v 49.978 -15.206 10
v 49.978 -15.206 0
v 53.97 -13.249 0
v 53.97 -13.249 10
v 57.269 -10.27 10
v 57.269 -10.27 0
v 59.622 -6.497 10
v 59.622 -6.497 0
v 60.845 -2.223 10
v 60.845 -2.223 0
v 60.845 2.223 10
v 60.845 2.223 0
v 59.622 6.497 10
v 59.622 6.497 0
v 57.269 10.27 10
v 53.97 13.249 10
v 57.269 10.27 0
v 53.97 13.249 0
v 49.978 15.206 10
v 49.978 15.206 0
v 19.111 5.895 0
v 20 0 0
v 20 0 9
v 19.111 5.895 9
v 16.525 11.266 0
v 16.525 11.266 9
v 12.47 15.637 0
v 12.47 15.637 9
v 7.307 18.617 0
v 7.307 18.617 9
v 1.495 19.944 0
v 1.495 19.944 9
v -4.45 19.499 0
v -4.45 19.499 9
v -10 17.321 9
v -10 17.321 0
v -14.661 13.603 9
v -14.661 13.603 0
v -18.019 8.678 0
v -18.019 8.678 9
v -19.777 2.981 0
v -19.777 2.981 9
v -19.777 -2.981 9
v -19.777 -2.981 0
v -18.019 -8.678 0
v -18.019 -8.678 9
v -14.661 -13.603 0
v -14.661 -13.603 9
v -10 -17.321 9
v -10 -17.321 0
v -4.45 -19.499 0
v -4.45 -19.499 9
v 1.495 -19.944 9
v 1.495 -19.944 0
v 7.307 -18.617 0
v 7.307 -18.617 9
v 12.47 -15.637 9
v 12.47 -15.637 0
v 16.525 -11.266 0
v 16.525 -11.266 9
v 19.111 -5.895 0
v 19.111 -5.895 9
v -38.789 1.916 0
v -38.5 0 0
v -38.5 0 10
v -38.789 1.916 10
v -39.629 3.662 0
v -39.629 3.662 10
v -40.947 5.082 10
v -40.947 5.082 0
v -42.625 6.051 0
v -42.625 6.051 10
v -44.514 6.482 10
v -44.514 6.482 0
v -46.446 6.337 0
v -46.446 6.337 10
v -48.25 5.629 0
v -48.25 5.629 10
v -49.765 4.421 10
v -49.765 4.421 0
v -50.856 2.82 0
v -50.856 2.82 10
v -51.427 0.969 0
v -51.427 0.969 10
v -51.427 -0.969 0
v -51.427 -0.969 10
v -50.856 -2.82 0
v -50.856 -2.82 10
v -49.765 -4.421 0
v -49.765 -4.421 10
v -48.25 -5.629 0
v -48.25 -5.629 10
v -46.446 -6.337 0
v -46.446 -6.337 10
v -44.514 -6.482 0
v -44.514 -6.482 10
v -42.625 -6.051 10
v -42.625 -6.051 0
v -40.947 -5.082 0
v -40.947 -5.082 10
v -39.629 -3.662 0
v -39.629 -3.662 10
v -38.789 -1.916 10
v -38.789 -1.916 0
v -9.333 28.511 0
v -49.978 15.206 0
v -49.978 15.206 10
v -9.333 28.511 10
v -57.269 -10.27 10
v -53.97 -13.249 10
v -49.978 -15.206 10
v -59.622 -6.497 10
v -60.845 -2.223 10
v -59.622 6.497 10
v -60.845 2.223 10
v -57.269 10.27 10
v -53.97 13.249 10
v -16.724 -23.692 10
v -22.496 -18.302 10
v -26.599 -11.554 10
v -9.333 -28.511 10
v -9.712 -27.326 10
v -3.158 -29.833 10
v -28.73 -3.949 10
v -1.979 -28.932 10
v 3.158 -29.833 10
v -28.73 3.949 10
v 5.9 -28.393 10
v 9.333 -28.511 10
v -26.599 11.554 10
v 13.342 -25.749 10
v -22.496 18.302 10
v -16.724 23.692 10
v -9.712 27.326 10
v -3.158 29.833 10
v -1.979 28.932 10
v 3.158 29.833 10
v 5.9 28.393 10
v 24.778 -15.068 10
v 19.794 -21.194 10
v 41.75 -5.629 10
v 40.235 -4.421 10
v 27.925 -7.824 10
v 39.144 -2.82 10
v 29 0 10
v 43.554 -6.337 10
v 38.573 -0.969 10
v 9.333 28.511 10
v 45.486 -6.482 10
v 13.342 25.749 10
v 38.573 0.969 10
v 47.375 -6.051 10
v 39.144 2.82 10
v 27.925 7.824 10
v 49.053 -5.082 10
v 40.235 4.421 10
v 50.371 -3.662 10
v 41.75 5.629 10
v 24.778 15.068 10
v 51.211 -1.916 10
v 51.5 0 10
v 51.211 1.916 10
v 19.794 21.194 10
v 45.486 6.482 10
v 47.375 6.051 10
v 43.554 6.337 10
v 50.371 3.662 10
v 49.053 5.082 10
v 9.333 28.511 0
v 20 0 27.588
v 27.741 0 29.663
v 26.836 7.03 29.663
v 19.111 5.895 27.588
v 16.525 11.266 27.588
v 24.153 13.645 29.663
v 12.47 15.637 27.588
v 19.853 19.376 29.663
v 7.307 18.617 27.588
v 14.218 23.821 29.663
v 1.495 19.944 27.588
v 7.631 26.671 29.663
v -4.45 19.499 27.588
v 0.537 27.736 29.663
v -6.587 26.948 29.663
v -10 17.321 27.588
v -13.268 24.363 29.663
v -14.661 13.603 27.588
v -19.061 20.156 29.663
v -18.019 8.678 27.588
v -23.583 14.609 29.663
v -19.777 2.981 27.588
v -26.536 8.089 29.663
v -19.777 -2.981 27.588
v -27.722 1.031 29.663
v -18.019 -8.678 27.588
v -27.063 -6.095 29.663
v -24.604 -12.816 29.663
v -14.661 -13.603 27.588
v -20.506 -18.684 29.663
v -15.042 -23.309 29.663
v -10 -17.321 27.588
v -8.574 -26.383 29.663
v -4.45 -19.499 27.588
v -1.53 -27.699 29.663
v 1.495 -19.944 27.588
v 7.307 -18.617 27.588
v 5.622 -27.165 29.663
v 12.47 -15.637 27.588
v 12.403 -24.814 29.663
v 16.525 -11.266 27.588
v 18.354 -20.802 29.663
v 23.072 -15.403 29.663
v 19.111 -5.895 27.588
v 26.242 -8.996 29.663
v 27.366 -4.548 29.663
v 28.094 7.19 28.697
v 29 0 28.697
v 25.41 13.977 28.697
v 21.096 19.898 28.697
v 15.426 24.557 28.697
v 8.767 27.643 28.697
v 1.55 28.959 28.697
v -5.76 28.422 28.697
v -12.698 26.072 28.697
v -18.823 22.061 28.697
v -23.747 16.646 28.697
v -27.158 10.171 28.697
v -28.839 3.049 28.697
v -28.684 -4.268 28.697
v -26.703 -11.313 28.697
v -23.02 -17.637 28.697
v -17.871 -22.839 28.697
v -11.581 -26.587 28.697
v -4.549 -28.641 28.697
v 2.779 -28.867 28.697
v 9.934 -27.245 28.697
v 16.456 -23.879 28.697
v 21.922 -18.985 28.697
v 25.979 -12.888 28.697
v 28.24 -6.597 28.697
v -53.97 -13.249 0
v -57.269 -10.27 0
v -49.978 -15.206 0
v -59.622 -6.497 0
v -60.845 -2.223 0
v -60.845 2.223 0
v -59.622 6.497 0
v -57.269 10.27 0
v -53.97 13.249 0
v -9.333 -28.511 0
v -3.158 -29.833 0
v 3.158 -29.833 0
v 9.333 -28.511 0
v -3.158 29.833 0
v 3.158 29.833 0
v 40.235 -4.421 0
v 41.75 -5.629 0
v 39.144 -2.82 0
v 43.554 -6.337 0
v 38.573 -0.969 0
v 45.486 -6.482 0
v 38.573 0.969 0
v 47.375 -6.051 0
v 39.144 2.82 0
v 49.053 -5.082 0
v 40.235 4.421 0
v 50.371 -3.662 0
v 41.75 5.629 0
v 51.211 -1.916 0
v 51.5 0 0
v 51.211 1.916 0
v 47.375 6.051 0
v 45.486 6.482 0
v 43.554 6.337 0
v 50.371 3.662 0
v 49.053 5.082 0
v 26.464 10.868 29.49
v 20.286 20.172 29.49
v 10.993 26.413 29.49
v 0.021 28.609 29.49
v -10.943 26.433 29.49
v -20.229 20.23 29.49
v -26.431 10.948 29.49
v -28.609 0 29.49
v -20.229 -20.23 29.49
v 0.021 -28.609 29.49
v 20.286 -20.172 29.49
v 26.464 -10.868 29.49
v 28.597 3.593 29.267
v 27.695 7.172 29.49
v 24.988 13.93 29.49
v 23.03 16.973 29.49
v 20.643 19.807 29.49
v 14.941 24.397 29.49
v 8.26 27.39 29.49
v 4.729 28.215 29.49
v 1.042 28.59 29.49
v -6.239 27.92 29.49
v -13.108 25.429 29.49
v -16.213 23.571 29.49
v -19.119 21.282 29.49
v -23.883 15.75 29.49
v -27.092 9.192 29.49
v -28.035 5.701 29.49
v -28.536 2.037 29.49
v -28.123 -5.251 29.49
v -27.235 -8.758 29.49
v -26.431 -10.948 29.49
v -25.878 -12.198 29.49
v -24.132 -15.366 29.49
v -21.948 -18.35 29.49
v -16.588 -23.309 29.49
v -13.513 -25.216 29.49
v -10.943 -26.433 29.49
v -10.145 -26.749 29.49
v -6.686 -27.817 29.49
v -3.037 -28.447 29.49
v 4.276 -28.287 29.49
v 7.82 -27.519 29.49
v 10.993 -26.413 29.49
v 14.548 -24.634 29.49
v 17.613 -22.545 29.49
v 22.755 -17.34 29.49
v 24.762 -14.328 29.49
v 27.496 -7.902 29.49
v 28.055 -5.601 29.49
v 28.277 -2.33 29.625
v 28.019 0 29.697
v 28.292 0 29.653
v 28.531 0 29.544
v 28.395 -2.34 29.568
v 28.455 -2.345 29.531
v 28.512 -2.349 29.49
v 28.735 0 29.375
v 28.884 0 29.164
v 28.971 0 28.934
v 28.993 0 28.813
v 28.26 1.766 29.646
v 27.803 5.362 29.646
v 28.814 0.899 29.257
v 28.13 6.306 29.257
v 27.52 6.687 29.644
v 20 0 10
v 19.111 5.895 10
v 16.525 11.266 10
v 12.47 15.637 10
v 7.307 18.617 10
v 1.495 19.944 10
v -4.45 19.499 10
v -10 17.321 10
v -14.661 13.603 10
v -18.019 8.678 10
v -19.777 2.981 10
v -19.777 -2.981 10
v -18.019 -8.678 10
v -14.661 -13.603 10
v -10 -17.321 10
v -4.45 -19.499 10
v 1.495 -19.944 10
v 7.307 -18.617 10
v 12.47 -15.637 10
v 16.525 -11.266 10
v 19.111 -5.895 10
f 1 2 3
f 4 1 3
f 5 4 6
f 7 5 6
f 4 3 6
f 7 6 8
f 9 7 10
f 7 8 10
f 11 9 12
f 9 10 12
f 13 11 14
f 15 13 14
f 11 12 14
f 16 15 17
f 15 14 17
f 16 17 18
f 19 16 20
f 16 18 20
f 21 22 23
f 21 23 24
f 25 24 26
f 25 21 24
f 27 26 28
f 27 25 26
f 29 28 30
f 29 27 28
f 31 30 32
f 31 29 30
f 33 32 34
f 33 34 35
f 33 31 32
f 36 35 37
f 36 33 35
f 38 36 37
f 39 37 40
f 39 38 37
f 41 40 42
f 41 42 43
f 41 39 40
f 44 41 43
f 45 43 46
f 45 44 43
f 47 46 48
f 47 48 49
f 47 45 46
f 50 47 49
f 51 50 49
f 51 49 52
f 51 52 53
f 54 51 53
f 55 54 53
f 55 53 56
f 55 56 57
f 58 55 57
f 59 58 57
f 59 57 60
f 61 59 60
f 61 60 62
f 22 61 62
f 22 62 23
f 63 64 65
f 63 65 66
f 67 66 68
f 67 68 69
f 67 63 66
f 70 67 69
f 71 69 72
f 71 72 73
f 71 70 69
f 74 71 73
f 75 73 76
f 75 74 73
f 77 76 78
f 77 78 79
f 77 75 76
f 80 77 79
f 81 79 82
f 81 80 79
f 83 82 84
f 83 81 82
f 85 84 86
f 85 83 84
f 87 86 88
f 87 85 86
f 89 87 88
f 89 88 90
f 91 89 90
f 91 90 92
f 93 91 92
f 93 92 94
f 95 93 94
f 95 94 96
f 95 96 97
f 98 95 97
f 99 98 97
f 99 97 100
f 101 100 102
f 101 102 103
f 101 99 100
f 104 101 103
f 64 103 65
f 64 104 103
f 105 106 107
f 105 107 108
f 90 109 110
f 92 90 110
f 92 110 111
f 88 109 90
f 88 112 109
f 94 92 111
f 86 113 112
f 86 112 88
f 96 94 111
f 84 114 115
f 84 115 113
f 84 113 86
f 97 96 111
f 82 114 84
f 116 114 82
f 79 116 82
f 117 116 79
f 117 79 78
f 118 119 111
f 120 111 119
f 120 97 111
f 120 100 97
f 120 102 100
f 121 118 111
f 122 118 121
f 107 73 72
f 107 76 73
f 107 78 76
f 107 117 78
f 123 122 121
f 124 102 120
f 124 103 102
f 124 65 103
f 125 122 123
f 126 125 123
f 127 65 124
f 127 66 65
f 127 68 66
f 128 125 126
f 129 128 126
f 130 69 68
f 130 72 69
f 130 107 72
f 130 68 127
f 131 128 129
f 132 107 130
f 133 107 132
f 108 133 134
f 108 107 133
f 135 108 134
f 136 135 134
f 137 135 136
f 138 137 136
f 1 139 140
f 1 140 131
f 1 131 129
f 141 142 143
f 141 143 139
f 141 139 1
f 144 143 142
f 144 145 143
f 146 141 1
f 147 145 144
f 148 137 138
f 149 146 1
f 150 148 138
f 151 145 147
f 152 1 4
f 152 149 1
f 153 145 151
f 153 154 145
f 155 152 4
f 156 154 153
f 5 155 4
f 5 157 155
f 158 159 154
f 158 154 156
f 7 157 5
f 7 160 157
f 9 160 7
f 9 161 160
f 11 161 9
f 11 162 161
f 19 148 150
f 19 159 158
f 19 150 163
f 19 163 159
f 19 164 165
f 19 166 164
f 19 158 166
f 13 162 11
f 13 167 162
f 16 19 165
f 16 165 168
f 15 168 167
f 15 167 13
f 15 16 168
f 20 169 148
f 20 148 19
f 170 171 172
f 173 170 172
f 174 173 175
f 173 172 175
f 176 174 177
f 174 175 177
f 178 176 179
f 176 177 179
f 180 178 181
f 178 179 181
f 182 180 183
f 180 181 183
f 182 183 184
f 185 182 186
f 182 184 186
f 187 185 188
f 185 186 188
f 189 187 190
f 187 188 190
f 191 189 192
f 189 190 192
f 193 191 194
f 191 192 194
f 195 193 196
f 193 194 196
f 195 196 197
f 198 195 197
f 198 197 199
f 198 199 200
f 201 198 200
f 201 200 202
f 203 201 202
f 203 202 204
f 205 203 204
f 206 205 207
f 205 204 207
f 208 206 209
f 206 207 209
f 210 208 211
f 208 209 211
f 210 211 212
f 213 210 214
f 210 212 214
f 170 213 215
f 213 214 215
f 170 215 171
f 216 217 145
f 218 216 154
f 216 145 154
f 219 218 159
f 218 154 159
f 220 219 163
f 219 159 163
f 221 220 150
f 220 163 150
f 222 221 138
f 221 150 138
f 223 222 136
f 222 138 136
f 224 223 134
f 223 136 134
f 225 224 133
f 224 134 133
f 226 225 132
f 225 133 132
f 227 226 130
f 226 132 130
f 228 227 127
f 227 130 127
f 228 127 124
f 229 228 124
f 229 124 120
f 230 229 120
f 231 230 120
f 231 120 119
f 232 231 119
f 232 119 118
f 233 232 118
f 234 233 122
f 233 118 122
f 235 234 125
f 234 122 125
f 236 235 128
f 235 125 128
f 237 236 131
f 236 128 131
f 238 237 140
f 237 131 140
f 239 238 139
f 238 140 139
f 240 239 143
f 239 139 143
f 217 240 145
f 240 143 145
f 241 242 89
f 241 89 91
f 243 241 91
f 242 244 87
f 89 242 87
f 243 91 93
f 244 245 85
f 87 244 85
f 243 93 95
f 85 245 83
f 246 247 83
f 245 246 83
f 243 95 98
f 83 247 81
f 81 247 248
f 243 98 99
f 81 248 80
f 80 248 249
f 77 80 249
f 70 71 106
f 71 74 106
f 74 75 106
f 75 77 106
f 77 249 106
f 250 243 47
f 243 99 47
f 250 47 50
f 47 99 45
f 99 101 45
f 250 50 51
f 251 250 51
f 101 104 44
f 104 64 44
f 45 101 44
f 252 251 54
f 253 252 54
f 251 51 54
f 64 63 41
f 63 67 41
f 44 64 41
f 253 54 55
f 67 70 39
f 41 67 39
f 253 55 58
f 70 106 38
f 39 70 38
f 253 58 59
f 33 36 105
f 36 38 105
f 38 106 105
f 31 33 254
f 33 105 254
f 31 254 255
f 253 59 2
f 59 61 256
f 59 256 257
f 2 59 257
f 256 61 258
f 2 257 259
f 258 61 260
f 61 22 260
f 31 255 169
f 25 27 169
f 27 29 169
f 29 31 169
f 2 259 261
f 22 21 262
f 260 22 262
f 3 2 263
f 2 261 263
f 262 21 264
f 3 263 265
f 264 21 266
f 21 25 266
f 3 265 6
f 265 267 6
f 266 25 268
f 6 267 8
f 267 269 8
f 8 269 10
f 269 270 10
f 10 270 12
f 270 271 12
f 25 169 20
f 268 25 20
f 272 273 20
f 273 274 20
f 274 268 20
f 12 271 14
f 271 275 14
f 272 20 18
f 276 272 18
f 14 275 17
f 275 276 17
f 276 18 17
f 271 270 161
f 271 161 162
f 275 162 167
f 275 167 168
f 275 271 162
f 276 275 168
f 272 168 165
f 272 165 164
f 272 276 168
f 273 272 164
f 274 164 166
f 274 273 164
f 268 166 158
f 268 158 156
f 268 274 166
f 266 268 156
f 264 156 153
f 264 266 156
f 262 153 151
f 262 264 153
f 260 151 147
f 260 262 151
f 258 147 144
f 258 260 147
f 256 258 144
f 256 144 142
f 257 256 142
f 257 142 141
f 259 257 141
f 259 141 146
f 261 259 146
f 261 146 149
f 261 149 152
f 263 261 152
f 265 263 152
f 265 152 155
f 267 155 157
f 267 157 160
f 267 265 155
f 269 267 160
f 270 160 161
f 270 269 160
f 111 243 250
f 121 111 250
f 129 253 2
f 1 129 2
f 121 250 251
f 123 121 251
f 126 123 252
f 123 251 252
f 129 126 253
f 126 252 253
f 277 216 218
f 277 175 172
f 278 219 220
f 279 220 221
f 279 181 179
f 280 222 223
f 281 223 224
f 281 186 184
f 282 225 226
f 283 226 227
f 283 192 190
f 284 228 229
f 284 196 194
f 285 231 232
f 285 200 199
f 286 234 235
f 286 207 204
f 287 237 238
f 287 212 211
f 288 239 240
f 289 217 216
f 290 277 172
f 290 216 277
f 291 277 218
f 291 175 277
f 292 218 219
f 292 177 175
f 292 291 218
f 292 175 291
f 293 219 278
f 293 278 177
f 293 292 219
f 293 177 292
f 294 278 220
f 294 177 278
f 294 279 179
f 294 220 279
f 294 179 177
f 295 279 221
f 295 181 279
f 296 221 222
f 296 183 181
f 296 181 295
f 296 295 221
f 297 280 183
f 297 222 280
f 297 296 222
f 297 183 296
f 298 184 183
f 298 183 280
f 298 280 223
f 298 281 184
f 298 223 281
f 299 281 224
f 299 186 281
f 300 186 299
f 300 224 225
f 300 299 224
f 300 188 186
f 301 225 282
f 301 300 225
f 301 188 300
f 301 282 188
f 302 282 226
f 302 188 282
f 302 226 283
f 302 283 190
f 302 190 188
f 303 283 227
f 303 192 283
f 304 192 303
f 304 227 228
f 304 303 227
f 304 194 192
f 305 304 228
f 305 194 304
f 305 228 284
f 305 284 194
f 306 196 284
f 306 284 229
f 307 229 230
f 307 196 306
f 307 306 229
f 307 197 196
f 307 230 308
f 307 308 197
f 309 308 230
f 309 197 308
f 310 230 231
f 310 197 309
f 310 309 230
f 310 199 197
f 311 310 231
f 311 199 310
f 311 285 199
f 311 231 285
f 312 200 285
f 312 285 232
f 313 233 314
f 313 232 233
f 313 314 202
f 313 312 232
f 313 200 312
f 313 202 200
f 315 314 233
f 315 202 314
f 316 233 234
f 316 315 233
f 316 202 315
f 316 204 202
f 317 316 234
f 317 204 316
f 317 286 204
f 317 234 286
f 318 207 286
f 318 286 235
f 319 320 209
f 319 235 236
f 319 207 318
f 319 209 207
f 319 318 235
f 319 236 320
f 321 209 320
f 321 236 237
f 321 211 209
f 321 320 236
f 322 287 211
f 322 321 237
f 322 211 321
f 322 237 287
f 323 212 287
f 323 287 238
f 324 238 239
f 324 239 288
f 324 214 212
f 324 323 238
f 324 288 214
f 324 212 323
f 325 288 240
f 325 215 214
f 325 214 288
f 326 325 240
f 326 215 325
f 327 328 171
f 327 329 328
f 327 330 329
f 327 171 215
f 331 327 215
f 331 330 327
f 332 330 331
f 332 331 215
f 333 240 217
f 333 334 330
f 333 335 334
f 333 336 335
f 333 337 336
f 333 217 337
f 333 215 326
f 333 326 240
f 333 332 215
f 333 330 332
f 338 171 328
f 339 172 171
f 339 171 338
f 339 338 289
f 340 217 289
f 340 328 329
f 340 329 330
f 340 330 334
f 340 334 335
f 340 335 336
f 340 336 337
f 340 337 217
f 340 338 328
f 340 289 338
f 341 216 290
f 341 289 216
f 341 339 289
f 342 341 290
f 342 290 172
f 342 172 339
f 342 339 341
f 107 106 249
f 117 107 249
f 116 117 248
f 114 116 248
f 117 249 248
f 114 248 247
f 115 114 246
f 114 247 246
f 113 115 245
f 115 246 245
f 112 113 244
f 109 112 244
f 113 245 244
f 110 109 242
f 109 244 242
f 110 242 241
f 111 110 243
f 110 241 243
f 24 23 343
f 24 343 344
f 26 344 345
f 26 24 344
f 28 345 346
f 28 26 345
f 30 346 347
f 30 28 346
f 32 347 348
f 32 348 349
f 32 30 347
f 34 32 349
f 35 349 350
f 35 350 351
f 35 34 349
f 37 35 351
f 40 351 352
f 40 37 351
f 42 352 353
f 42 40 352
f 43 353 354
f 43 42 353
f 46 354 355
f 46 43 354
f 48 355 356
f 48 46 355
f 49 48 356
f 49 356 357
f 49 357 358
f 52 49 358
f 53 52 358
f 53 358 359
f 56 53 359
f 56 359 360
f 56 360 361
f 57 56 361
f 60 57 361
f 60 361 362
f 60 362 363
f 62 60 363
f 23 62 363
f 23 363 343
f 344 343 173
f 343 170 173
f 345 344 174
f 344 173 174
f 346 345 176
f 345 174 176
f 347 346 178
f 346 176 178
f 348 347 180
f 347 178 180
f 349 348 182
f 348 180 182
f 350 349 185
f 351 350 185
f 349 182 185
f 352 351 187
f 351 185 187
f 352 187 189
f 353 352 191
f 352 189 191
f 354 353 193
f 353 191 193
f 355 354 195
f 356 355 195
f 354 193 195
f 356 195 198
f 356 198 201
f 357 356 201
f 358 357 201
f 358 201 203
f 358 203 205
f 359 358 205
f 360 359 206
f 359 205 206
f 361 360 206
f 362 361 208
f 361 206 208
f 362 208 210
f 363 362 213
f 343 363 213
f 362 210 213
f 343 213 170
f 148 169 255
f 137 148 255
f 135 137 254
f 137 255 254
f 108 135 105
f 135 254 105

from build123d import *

# Parameters (mm, degrees)
SKETCH_R   = 20
SKETCH_R_2 = 6.5
PAD_DEPTH  = 10
FILLET_R   = 1


with BuildPart() as revolution:
    # Sketch001 → Revolution (revolve)
    with BuildSketch(Plane.XZ):
        Polygon((20, 9), (20, 27.588457), (29, 30), (29, 9), align=None)
    revolve(axis=Axis((0, 0, 0), (0, 0, 1)))


with BuildPart() as fillet_body:
    # Sketch → Pad (new body)
    with BuildSketch(Plane.XY):
        with BuildLine():
            ThreePointArc((9.333333, 28.511206), (0, 30), (-9.333333, 28.511206))
            Line((-49.977778, 15.205977), (-9.333333, 28.511206))
            ThreePointArc((-49.977778, 15.205977), (-61, 0), (-49.977778, -15.205977))
            Line((-49.977778, -15.205977), (-9.333333, -28.511206))
            ThreePointArc((-9.333333, -28.511206), (0, -30), (9.333333, -28.511206))
            Line((9.333333, -28.511206), (49.977778, -15.205977))
            ThreePointArc((49.977778, -15.205977), (61, 0), (49.977778, 15.205977))
            Line((9.333333, 28.511206), (49.977778, 15.205977))
        make_face()
        Circle(SKETCH_R, mode=Mode.SUBTRACT)
        with Locations((-45, 0)):
            Circle(SKETCH_R_2, mode=Mode.SUBTRACT)
        with Locations((45, 0)):
            Circle(SKETCH_R_2, mode=Mode.SUBTRACT)
    extrude(amount=PAD_DEPTH)

    # Fusion: union Revolution
    add(revolution.part)

    # Fillet
    fillet_edges = [fillet_body.edges().sort_by_distance(p)[0] for p in [
        (-29, 0, 30),
    ]]
    fillet(fillet_edges, radius=FILLET_R)


solid = fillet_body.part
